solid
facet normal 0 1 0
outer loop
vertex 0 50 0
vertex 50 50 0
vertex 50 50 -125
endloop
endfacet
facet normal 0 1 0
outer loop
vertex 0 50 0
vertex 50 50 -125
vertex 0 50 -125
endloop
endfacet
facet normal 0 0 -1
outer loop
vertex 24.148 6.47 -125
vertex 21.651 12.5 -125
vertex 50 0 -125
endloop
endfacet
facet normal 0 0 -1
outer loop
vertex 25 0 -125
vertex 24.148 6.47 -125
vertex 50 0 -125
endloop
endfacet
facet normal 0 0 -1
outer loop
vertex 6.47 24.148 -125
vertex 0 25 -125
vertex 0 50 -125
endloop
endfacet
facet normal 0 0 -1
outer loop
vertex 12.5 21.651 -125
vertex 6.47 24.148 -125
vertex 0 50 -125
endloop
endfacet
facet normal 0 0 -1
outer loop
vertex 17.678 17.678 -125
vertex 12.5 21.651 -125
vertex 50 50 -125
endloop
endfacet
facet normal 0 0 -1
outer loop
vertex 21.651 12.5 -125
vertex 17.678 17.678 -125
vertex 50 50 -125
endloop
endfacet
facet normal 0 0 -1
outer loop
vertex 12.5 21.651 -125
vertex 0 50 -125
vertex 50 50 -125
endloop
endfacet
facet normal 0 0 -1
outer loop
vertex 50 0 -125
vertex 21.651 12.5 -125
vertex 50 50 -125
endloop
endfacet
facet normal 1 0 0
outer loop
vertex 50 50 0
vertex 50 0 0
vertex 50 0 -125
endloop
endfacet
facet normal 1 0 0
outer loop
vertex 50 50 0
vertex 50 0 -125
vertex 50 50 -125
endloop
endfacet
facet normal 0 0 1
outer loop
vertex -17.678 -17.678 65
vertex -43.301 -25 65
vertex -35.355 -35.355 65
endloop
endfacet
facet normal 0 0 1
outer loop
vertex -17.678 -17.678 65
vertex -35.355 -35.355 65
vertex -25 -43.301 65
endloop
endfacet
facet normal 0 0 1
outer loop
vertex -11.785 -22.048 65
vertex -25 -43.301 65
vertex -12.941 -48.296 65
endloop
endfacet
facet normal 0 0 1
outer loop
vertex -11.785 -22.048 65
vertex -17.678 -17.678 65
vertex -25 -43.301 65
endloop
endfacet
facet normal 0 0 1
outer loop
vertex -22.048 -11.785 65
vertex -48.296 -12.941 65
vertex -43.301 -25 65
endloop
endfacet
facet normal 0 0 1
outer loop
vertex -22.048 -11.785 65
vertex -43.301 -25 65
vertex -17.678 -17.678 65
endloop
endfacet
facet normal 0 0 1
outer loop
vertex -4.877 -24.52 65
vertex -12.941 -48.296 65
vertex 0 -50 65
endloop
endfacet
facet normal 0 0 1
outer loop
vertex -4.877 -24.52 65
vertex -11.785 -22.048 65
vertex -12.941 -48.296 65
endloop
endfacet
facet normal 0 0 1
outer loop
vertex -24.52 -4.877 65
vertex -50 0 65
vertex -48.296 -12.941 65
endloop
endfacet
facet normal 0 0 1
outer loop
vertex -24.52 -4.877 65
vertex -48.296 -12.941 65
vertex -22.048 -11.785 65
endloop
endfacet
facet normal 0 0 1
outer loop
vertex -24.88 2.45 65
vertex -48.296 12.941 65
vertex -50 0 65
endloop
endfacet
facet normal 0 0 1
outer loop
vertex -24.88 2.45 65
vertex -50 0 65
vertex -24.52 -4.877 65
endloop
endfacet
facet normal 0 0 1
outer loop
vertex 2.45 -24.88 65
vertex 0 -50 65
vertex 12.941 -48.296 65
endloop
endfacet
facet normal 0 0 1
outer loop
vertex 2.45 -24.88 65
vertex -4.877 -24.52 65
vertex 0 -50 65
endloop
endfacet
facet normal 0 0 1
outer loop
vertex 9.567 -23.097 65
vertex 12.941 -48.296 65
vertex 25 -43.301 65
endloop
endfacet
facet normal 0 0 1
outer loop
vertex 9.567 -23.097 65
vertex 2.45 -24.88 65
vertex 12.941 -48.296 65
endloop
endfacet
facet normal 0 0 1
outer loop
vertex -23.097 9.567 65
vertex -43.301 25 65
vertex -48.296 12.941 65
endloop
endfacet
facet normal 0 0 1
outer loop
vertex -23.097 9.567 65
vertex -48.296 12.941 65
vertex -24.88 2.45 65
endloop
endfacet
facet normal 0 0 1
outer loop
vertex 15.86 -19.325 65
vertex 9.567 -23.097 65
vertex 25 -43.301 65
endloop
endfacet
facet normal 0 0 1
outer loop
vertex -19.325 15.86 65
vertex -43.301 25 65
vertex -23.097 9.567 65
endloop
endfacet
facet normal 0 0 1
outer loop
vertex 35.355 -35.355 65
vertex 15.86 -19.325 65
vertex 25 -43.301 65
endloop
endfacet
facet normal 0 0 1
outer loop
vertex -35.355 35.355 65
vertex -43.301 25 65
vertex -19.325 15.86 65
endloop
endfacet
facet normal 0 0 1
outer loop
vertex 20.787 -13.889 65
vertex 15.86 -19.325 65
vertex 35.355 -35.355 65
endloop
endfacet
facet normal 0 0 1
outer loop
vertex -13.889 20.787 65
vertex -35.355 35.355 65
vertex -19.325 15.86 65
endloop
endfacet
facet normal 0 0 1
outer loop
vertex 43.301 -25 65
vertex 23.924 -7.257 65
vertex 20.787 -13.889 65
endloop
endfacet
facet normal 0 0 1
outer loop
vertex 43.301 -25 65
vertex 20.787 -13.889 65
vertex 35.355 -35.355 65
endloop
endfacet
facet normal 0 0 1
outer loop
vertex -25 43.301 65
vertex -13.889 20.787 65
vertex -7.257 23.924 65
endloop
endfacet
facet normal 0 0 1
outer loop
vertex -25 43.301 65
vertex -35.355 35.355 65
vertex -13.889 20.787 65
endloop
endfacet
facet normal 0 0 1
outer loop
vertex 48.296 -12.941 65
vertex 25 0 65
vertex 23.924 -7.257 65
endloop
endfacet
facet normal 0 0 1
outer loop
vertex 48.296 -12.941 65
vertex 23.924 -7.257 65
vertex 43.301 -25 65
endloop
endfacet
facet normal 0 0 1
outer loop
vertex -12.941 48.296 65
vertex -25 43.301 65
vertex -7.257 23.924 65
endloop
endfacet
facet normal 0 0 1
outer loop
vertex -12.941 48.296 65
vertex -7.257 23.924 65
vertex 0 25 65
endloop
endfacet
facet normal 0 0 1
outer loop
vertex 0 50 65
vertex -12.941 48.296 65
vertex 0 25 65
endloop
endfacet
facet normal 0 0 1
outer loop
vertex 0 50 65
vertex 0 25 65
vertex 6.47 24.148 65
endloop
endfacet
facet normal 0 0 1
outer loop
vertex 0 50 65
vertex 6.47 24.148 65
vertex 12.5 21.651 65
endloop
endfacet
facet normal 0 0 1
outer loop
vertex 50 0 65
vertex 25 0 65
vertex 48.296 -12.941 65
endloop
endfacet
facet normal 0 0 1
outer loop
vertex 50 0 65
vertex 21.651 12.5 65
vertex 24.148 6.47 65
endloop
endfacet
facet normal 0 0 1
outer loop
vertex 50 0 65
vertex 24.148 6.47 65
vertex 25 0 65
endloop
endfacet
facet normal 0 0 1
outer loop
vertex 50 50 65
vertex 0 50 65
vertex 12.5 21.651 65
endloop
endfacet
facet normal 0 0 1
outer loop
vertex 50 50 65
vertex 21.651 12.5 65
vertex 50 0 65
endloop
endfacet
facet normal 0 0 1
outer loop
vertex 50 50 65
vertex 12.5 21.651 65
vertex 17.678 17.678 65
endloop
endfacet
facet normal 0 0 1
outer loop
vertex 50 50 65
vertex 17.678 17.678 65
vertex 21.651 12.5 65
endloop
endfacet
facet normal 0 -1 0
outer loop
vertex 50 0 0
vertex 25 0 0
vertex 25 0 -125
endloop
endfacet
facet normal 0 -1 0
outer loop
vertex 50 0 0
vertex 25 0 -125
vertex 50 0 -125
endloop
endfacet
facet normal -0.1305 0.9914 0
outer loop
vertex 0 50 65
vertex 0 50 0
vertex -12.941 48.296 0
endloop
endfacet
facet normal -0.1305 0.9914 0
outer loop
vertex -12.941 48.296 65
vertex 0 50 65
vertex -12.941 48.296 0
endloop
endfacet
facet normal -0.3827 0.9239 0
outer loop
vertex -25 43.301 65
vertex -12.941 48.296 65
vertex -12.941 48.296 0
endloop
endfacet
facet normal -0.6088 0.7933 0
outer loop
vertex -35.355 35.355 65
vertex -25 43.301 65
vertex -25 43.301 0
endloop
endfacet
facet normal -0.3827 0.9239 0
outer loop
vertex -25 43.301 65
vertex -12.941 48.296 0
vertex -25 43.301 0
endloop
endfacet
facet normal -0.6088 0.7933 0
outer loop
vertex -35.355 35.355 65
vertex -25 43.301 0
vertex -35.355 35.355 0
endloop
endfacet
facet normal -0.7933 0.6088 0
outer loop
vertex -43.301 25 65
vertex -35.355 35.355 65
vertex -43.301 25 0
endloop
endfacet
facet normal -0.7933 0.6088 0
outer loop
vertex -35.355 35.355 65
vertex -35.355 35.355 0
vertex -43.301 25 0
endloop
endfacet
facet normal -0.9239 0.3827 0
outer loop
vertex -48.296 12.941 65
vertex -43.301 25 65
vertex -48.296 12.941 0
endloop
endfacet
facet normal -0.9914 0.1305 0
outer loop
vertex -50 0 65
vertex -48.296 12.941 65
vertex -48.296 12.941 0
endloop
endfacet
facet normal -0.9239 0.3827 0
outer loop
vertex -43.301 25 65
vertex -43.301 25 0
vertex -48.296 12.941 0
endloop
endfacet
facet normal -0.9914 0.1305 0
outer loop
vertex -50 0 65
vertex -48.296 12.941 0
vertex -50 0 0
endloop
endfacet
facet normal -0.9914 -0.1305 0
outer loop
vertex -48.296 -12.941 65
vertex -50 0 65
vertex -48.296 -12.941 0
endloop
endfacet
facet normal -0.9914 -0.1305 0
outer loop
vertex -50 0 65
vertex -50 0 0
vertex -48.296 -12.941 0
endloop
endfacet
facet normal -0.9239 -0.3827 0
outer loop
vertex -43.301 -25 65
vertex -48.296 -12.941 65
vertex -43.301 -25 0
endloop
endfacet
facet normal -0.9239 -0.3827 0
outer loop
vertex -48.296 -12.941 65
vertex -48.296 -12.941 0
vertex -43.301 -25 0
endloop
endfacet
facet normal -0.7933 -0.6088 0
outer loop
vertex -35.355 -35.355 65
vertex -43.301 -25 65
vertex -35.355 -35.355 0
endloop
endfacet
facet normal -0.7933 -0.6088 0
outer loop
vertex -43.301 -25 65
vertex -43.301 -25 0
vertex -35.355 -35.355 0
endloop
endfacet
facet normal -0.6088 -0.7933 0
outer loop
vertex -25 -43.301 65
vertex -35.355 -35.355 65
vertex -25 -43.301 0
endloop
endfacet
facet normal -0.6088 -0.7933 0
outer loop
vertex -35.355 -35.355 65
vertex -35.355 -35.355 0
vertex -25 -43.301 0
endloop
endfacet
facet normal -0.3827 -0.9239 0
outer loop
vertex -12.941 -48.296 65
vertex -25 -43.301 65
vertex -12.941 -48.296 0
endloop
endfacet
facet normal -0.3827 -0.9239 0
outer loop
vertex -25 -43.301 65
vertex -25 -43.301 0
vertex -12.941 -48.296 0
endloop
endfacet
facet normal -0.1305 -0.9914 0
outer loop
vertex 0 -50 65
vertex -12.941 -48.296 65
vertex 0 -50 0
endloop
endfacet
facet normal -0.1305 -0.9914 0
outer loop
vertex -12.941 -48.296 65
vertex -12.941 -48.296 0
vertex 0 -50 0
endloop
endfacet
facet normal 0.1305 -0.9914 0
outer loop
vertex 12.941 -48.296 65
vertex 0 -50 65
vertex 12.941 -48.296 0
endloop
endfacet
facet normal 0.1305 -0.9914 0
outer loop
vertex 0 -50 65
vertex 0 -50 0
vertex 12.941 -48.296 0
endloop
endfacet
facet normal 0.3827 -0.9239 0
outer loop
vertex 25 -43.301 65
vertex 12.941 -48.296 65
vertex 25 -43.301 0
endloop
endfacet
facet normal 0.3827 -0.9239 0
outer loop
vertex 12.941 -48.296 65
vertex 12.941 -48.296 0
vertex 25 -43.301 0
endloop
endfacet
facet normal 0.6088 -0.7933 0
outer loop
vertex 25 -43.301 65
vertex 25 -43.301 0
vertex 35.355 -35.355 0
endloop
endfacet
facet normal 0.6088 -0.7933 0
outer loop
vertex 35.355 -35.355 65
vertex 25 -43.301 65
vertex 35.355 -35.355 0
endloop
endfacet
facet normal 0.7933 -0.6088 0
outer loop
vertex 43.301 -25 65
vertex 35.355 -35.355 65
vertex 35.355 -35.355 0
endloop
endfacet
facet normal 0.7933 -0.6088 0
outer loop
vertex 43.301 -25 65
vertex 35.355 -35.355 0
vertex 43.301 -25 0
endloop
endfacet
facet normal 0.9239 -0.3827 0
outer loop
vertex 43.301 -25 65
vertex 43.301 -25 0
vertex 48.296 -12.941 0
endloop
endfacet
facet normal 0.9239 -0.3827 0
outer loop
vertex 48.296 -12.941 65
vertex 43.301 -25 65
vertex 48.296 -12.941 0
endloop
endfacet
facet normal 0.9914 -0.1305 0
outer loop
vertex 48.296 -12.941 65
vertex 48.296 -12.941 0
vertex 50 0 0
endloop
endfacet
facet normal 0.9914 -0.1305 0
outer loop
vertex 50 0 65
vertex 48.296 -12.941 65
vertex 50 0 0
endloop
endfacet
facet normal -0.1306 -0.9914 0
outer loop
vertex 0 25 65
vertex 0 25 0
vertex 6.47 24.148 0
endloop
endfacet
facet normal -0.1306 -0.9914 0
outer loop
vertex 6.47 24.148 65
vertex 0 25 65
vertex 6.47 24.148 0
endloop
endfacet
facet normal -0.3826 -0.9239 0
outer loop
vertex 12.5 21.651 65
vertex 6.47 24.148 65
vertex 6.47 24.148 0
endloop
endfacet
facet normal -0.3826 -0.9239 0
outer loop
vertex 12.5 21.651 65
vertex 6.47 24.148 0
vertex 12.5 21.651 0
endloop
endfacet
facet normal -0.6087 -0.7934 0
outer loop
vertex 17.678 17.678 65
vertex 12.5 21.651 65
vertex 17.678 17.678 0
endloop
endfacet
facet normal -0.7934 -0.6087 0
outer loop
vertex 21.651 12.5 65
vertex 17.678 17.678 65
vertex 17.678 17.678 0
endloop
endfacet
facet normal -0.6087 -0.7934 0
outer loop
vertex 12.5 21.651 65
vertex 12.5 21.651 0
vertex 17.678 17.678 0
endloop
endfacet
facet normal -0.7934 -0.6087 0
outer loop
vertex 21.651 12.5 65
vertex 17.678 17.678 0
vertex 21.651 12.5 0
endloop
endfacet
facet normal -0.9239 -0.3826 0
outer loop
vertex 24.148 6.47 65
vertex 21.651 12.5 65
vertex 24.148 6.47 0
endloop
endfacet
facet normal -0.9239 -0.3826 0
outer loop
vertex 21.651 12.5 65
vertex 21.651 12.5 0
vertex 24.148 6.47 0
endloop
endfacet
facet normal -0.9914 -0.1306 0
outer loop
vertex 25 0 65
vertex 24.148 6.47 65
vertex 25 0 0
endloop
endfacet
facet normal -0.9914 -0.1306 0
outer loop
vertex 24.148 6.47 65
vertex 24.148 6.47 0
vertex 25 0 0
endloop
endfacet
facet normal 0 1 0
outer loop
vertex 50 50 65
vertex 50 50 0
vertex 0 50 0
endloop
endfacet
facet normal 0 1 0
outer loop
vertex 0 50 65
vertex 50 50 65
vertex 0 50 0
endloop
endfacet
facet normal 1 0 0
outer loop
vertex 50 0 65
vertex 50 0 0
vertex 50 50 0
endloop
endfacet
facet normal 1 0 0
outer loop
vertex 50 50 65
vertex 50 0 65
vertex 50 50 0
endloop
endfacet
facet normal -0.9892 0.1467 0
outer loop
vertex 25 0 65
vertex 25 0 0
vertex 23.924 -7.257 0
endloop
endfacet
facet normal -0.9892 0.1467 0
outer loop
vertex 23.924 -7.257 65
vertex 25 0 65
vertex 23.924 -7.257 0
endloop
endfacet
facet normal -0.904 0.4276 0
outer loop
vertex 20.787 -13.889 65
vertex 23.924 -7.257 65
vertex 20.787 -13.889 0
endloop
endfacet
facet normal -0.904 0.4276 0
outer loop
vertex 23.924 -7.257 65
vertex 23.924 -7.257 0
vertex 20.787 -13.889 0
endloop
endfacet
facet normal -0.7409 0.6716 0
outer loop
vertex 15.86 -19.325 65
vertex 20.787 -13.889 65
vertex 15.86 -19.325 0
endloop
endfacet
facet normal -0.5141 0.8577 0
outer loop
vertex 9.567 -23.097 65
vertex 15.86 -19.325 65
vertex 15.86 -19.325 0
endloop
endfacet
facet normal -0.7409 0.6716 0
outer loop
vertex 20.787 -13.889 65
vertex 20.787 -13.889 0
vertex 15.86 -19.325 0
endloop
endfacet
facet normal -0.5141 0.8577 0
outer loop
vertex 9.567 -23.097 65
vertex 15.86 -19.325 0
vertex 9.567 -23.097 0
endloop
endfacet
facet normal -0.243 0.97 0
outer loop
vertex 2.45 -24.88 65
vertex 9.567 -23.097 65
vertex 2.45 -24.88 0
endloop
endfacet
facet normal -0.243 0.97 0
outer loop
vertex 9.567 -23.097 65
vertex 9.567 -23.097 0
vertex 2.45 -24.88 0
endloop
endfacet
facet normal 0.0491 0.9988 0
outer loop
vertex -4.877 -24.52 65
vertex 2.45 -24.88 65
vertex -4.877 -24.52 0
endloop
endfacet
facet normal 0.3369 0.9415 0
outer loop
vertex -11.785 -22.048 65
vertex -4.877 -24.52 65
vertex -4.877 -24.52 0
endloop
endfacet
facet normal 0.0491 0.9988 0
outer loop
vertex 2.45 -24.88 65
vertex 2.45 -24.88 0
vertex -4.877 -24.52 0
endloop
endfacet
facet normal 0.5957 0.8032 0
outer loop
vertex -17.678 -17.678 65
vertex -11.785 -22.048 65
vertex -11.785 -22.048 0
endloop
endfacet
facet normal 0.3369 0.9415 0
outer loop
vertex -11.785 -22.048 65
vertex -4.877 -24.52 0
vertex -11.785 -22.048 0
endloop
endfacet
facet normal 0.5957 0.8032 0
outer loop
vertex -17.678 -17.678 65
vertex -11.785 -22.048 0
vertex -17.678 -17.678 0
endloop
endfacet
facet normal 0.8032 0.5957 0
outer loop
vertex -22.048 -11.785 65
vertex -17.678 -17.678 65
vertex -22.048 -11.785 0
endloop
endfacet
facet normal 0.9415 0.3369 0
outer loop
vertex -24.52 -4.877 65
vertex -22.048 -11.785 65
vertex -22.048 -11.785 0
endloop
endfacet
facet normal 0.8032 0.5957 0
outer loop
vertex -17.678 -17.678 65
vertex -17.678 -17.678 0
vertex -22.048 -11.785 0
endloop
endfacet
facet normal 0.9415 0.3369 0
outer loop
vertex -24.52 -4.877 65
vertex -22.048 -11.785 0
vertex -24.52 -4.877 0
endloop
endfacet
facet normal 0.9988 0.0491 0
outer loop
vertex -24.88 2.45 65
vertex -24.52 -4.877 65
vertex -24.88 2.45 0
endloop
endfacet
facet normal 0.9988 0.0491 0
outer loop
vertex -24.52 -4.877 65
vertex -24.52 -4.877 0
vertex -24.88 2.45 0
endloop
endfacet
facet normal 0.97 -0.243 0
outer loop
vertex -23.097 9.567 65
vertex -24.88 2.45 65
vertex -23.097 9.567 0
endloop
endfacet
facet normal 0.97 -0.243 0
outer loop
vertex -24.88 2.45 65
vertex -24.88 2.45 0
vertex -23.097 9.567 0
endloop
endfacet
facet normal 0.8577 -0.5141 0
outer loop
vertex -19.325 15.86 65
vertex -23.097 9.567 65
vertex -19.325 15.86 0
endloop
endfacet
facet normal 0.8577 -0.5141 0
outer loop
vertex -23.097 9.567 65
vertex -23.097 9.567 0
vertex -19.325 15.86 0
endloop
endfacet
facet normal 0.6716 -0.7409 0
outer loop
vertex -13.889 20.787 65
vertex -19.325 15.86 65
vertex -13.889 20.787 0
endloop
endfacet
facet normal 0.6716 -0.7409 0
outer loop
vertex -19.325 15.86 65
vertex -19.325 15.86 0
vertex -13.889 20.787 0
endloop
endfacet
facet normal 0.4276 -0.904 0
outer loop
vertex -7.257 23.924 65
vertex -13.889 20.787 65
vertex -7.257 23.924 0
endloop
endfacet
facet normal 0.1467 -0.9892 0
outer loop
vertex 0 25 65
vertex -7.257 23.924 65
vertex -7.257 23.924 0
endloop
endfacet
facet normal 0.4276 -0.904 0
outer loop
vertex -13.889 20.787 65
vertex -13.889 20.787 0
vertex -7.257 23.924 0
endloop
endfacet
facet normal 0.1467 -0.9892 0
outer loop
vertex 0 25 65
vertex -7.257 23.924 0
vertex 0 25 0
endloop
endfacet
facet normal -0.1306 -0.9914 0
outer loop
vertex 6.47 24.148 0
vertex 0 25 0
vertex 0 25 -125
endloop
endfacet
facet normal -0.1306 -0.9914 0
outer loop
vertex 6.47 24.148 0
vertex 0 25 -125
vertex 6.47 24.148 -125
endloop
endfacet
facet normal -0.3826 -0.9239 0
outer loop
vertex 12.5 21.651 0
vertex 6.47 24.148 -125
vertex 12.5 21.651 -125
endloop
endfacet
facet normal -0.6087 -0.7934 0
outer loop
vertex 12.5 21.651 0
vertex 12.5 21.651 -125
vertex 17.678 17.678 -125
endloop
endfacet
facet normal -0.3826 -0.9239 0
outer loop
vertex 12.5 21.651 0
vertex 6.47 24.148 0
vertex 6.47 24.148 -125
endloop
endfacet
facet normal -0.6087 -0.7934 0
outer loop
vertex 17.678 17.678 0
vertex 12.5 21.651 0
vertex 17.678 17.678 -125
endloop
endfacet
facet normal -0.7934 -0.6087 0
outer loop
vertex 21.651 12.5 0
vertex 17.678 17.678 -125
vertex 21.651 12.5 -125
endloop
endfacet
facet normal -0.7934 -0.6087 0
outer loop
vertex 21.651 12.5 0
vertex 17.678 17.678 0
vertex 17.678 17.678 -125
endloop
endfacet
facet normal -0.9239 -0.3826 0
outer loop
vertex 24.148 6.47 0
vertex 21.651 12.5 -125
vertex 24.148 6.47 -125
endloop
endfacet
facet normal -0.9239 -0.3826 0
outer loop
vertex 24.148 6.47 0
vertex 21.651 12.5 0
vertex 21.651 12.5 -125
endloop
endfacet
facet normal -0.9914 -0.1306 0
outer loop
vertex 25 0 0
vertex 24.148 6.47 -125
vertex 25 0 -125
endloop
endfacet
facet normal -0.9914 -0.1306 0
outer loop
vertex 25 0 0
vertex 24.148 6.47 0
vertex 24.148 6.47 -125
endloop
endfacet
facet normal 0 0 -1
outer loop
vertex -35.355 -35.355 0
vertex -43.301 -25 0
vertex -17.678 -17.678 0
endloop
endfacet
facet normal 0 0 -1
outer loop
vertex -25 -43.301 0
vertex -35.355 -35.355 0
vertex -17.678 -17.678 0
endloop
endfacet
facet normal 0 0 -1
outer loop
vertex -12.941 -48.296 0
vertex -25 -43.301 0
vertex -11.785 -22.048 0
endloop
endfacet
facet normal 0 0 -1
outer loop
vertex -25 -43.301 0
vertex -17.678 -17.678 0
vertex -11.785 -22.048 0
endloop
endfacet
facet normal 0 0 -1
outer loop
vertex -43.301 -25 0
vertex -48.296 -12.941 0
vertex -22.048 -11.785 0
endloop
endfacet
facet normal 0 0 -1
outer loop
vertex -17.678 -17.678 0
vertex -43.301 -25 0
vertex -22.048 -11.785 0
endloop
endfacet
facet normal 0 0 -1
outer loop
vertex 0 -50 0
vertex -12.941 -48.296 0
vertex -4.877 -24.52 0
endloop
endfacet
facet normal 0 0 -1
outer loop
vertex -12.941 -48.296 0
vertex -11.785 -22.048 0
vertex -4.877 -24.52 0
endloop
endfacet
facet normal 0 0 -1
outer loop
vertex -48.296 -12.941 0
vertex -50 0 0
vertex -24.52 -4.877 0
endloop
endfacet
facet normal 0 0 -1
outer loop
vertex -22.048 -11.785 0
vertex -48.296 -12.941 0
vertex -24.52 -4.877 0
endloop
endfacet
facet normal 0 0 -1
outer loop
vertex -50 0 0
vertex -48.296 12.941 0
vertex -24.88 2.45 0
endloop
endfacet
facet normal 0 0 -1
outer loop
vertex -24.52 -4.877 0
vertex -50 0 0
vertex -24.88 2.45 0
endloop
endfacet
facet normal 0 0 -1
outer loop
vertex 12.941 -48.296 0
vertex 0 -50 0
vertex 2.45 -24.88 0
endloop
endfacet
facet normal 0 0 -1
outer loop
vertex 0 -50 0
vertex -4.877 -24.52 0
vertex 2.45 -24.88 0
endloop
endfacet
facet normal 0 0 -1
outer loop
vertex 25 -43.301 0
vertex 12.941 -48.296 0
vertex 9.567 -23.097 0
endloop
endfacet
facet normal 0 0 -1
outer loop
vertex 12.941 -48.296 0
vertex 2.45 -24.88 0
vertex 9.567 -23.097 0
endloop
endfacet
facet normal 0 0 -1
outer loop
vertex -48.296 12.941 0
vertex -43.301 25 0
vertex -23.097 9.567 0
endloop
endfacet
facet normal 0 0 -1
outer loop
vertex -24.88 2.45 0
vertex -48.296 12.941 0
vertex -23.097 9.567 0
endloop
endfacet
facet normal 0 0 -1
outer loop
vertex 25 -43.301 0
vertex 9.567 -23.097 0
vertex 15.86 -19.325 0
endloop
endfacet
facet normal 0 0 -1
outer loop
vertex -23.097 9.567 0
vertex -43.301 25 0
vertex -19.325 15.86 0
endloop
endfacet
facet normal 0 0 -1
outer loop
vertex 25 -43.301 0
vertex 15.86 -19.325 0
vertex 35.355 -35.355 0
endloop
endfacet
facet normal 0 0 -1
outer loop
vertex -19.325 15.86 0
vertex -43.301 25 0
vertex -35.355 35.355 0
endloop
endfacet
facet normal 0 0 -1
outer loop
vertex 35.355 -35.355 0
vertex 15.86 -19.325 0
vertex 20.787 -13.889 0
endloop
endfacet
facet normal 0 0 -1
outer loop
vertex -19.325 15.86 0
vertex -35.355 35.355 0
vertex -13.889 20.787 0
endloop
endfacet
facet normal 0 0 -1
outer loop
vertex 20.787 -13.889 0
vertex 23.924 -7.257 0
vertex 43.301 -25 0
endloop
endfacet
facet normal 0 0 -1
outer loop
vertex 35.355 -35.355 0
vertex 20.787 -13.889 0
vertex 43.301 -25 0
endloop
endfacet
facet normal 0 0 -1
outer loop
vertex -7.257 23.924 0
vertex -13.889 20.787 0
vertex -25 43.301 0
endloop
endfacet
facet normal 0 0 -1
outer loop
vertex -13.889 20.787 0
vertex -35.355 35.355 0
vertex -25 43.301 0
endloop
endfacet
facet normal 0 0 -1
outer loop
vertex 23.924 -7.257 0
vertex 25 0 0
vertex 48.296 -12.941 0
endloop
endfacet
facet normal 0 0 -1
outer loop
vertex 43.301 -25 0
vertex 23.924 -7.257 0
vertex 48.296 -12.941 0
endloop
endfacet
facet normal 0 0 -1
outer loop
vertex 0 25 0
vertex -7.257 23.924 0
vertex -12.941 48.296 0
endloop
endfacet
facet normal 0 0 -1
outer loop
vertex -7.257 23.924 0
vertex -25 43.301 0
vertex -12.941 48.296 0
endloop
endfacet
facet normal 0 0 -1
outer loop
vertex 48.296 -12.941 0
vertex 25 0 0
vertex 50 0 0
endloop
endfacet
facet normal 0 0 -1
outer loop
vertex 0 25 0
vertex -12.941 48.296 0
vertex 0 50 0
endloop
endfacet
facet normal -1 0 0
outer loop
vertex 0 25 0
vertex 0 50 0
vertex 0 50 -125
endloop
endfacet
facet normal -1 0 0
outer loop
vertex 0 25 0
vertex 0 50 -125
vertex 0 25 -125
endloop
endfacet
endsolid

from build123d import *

# Parameters (mm, degrees)
F1_DEPTH = 65
F2_DEPTH = 125


with BuildPart() as f1:
    # F0 (on Top) → F1 (new body)
    with BuildSketch(Plane.XY):
        with BuildLine():
            Line((50, 0), (25, 0))
            ThreePointArc((25, 0), (-17.6776695297, -17.6776695297), (0, 25))
            Line((0, 25), (0, 50))
            ThreePointArc((0, 50), (-35.3553390593, -35.3553390593), (50, 0))
        make_face()
        with BuildLine():
            ThreePointArc((0, 25), (17.6776695297, 17.6776695297), (25, 0))
            Line((25, 0), (50, 0))
            ThreePointArc((50, 0), (35.3553390593, 35.3553390593), (0, 50))
            Line((0, 50), (0, 25))
        make_face()
        with BuildLine():
            ThreePointArc((0, 50), (35.3553390593, 35.3553390593), (50, 0))
            Line((50, 0), (50, 50))
            Line((50, 50), (0, 50))
        make_face()
    extrude(amount=F1_DEPTH)

    # F0 (on Top) → F2 (join)
    with BuildSketch(Plane.XY):
        with BuildLine():
            ThreePointArc((0, 25), (17.6776695297, 17.6776695297), (25, 0))
            Line((25, 0), (50, 0))
            ThreePointArc((50, 0), (35.3553390593, 35.3553390593), (0, 50))
            Line((0, 50), (0, 25))
        make_face()
        with BuildLine():
            ThreePointArc((0, 50), (35.3553390593, 35.3553390593), (50, 0))
            Line((50, 0), (50, 50))
            Line((50, 50), (0, 50))
        make_face()
    extrude(amount=-F2_DEPTH)


solid = f1.part
